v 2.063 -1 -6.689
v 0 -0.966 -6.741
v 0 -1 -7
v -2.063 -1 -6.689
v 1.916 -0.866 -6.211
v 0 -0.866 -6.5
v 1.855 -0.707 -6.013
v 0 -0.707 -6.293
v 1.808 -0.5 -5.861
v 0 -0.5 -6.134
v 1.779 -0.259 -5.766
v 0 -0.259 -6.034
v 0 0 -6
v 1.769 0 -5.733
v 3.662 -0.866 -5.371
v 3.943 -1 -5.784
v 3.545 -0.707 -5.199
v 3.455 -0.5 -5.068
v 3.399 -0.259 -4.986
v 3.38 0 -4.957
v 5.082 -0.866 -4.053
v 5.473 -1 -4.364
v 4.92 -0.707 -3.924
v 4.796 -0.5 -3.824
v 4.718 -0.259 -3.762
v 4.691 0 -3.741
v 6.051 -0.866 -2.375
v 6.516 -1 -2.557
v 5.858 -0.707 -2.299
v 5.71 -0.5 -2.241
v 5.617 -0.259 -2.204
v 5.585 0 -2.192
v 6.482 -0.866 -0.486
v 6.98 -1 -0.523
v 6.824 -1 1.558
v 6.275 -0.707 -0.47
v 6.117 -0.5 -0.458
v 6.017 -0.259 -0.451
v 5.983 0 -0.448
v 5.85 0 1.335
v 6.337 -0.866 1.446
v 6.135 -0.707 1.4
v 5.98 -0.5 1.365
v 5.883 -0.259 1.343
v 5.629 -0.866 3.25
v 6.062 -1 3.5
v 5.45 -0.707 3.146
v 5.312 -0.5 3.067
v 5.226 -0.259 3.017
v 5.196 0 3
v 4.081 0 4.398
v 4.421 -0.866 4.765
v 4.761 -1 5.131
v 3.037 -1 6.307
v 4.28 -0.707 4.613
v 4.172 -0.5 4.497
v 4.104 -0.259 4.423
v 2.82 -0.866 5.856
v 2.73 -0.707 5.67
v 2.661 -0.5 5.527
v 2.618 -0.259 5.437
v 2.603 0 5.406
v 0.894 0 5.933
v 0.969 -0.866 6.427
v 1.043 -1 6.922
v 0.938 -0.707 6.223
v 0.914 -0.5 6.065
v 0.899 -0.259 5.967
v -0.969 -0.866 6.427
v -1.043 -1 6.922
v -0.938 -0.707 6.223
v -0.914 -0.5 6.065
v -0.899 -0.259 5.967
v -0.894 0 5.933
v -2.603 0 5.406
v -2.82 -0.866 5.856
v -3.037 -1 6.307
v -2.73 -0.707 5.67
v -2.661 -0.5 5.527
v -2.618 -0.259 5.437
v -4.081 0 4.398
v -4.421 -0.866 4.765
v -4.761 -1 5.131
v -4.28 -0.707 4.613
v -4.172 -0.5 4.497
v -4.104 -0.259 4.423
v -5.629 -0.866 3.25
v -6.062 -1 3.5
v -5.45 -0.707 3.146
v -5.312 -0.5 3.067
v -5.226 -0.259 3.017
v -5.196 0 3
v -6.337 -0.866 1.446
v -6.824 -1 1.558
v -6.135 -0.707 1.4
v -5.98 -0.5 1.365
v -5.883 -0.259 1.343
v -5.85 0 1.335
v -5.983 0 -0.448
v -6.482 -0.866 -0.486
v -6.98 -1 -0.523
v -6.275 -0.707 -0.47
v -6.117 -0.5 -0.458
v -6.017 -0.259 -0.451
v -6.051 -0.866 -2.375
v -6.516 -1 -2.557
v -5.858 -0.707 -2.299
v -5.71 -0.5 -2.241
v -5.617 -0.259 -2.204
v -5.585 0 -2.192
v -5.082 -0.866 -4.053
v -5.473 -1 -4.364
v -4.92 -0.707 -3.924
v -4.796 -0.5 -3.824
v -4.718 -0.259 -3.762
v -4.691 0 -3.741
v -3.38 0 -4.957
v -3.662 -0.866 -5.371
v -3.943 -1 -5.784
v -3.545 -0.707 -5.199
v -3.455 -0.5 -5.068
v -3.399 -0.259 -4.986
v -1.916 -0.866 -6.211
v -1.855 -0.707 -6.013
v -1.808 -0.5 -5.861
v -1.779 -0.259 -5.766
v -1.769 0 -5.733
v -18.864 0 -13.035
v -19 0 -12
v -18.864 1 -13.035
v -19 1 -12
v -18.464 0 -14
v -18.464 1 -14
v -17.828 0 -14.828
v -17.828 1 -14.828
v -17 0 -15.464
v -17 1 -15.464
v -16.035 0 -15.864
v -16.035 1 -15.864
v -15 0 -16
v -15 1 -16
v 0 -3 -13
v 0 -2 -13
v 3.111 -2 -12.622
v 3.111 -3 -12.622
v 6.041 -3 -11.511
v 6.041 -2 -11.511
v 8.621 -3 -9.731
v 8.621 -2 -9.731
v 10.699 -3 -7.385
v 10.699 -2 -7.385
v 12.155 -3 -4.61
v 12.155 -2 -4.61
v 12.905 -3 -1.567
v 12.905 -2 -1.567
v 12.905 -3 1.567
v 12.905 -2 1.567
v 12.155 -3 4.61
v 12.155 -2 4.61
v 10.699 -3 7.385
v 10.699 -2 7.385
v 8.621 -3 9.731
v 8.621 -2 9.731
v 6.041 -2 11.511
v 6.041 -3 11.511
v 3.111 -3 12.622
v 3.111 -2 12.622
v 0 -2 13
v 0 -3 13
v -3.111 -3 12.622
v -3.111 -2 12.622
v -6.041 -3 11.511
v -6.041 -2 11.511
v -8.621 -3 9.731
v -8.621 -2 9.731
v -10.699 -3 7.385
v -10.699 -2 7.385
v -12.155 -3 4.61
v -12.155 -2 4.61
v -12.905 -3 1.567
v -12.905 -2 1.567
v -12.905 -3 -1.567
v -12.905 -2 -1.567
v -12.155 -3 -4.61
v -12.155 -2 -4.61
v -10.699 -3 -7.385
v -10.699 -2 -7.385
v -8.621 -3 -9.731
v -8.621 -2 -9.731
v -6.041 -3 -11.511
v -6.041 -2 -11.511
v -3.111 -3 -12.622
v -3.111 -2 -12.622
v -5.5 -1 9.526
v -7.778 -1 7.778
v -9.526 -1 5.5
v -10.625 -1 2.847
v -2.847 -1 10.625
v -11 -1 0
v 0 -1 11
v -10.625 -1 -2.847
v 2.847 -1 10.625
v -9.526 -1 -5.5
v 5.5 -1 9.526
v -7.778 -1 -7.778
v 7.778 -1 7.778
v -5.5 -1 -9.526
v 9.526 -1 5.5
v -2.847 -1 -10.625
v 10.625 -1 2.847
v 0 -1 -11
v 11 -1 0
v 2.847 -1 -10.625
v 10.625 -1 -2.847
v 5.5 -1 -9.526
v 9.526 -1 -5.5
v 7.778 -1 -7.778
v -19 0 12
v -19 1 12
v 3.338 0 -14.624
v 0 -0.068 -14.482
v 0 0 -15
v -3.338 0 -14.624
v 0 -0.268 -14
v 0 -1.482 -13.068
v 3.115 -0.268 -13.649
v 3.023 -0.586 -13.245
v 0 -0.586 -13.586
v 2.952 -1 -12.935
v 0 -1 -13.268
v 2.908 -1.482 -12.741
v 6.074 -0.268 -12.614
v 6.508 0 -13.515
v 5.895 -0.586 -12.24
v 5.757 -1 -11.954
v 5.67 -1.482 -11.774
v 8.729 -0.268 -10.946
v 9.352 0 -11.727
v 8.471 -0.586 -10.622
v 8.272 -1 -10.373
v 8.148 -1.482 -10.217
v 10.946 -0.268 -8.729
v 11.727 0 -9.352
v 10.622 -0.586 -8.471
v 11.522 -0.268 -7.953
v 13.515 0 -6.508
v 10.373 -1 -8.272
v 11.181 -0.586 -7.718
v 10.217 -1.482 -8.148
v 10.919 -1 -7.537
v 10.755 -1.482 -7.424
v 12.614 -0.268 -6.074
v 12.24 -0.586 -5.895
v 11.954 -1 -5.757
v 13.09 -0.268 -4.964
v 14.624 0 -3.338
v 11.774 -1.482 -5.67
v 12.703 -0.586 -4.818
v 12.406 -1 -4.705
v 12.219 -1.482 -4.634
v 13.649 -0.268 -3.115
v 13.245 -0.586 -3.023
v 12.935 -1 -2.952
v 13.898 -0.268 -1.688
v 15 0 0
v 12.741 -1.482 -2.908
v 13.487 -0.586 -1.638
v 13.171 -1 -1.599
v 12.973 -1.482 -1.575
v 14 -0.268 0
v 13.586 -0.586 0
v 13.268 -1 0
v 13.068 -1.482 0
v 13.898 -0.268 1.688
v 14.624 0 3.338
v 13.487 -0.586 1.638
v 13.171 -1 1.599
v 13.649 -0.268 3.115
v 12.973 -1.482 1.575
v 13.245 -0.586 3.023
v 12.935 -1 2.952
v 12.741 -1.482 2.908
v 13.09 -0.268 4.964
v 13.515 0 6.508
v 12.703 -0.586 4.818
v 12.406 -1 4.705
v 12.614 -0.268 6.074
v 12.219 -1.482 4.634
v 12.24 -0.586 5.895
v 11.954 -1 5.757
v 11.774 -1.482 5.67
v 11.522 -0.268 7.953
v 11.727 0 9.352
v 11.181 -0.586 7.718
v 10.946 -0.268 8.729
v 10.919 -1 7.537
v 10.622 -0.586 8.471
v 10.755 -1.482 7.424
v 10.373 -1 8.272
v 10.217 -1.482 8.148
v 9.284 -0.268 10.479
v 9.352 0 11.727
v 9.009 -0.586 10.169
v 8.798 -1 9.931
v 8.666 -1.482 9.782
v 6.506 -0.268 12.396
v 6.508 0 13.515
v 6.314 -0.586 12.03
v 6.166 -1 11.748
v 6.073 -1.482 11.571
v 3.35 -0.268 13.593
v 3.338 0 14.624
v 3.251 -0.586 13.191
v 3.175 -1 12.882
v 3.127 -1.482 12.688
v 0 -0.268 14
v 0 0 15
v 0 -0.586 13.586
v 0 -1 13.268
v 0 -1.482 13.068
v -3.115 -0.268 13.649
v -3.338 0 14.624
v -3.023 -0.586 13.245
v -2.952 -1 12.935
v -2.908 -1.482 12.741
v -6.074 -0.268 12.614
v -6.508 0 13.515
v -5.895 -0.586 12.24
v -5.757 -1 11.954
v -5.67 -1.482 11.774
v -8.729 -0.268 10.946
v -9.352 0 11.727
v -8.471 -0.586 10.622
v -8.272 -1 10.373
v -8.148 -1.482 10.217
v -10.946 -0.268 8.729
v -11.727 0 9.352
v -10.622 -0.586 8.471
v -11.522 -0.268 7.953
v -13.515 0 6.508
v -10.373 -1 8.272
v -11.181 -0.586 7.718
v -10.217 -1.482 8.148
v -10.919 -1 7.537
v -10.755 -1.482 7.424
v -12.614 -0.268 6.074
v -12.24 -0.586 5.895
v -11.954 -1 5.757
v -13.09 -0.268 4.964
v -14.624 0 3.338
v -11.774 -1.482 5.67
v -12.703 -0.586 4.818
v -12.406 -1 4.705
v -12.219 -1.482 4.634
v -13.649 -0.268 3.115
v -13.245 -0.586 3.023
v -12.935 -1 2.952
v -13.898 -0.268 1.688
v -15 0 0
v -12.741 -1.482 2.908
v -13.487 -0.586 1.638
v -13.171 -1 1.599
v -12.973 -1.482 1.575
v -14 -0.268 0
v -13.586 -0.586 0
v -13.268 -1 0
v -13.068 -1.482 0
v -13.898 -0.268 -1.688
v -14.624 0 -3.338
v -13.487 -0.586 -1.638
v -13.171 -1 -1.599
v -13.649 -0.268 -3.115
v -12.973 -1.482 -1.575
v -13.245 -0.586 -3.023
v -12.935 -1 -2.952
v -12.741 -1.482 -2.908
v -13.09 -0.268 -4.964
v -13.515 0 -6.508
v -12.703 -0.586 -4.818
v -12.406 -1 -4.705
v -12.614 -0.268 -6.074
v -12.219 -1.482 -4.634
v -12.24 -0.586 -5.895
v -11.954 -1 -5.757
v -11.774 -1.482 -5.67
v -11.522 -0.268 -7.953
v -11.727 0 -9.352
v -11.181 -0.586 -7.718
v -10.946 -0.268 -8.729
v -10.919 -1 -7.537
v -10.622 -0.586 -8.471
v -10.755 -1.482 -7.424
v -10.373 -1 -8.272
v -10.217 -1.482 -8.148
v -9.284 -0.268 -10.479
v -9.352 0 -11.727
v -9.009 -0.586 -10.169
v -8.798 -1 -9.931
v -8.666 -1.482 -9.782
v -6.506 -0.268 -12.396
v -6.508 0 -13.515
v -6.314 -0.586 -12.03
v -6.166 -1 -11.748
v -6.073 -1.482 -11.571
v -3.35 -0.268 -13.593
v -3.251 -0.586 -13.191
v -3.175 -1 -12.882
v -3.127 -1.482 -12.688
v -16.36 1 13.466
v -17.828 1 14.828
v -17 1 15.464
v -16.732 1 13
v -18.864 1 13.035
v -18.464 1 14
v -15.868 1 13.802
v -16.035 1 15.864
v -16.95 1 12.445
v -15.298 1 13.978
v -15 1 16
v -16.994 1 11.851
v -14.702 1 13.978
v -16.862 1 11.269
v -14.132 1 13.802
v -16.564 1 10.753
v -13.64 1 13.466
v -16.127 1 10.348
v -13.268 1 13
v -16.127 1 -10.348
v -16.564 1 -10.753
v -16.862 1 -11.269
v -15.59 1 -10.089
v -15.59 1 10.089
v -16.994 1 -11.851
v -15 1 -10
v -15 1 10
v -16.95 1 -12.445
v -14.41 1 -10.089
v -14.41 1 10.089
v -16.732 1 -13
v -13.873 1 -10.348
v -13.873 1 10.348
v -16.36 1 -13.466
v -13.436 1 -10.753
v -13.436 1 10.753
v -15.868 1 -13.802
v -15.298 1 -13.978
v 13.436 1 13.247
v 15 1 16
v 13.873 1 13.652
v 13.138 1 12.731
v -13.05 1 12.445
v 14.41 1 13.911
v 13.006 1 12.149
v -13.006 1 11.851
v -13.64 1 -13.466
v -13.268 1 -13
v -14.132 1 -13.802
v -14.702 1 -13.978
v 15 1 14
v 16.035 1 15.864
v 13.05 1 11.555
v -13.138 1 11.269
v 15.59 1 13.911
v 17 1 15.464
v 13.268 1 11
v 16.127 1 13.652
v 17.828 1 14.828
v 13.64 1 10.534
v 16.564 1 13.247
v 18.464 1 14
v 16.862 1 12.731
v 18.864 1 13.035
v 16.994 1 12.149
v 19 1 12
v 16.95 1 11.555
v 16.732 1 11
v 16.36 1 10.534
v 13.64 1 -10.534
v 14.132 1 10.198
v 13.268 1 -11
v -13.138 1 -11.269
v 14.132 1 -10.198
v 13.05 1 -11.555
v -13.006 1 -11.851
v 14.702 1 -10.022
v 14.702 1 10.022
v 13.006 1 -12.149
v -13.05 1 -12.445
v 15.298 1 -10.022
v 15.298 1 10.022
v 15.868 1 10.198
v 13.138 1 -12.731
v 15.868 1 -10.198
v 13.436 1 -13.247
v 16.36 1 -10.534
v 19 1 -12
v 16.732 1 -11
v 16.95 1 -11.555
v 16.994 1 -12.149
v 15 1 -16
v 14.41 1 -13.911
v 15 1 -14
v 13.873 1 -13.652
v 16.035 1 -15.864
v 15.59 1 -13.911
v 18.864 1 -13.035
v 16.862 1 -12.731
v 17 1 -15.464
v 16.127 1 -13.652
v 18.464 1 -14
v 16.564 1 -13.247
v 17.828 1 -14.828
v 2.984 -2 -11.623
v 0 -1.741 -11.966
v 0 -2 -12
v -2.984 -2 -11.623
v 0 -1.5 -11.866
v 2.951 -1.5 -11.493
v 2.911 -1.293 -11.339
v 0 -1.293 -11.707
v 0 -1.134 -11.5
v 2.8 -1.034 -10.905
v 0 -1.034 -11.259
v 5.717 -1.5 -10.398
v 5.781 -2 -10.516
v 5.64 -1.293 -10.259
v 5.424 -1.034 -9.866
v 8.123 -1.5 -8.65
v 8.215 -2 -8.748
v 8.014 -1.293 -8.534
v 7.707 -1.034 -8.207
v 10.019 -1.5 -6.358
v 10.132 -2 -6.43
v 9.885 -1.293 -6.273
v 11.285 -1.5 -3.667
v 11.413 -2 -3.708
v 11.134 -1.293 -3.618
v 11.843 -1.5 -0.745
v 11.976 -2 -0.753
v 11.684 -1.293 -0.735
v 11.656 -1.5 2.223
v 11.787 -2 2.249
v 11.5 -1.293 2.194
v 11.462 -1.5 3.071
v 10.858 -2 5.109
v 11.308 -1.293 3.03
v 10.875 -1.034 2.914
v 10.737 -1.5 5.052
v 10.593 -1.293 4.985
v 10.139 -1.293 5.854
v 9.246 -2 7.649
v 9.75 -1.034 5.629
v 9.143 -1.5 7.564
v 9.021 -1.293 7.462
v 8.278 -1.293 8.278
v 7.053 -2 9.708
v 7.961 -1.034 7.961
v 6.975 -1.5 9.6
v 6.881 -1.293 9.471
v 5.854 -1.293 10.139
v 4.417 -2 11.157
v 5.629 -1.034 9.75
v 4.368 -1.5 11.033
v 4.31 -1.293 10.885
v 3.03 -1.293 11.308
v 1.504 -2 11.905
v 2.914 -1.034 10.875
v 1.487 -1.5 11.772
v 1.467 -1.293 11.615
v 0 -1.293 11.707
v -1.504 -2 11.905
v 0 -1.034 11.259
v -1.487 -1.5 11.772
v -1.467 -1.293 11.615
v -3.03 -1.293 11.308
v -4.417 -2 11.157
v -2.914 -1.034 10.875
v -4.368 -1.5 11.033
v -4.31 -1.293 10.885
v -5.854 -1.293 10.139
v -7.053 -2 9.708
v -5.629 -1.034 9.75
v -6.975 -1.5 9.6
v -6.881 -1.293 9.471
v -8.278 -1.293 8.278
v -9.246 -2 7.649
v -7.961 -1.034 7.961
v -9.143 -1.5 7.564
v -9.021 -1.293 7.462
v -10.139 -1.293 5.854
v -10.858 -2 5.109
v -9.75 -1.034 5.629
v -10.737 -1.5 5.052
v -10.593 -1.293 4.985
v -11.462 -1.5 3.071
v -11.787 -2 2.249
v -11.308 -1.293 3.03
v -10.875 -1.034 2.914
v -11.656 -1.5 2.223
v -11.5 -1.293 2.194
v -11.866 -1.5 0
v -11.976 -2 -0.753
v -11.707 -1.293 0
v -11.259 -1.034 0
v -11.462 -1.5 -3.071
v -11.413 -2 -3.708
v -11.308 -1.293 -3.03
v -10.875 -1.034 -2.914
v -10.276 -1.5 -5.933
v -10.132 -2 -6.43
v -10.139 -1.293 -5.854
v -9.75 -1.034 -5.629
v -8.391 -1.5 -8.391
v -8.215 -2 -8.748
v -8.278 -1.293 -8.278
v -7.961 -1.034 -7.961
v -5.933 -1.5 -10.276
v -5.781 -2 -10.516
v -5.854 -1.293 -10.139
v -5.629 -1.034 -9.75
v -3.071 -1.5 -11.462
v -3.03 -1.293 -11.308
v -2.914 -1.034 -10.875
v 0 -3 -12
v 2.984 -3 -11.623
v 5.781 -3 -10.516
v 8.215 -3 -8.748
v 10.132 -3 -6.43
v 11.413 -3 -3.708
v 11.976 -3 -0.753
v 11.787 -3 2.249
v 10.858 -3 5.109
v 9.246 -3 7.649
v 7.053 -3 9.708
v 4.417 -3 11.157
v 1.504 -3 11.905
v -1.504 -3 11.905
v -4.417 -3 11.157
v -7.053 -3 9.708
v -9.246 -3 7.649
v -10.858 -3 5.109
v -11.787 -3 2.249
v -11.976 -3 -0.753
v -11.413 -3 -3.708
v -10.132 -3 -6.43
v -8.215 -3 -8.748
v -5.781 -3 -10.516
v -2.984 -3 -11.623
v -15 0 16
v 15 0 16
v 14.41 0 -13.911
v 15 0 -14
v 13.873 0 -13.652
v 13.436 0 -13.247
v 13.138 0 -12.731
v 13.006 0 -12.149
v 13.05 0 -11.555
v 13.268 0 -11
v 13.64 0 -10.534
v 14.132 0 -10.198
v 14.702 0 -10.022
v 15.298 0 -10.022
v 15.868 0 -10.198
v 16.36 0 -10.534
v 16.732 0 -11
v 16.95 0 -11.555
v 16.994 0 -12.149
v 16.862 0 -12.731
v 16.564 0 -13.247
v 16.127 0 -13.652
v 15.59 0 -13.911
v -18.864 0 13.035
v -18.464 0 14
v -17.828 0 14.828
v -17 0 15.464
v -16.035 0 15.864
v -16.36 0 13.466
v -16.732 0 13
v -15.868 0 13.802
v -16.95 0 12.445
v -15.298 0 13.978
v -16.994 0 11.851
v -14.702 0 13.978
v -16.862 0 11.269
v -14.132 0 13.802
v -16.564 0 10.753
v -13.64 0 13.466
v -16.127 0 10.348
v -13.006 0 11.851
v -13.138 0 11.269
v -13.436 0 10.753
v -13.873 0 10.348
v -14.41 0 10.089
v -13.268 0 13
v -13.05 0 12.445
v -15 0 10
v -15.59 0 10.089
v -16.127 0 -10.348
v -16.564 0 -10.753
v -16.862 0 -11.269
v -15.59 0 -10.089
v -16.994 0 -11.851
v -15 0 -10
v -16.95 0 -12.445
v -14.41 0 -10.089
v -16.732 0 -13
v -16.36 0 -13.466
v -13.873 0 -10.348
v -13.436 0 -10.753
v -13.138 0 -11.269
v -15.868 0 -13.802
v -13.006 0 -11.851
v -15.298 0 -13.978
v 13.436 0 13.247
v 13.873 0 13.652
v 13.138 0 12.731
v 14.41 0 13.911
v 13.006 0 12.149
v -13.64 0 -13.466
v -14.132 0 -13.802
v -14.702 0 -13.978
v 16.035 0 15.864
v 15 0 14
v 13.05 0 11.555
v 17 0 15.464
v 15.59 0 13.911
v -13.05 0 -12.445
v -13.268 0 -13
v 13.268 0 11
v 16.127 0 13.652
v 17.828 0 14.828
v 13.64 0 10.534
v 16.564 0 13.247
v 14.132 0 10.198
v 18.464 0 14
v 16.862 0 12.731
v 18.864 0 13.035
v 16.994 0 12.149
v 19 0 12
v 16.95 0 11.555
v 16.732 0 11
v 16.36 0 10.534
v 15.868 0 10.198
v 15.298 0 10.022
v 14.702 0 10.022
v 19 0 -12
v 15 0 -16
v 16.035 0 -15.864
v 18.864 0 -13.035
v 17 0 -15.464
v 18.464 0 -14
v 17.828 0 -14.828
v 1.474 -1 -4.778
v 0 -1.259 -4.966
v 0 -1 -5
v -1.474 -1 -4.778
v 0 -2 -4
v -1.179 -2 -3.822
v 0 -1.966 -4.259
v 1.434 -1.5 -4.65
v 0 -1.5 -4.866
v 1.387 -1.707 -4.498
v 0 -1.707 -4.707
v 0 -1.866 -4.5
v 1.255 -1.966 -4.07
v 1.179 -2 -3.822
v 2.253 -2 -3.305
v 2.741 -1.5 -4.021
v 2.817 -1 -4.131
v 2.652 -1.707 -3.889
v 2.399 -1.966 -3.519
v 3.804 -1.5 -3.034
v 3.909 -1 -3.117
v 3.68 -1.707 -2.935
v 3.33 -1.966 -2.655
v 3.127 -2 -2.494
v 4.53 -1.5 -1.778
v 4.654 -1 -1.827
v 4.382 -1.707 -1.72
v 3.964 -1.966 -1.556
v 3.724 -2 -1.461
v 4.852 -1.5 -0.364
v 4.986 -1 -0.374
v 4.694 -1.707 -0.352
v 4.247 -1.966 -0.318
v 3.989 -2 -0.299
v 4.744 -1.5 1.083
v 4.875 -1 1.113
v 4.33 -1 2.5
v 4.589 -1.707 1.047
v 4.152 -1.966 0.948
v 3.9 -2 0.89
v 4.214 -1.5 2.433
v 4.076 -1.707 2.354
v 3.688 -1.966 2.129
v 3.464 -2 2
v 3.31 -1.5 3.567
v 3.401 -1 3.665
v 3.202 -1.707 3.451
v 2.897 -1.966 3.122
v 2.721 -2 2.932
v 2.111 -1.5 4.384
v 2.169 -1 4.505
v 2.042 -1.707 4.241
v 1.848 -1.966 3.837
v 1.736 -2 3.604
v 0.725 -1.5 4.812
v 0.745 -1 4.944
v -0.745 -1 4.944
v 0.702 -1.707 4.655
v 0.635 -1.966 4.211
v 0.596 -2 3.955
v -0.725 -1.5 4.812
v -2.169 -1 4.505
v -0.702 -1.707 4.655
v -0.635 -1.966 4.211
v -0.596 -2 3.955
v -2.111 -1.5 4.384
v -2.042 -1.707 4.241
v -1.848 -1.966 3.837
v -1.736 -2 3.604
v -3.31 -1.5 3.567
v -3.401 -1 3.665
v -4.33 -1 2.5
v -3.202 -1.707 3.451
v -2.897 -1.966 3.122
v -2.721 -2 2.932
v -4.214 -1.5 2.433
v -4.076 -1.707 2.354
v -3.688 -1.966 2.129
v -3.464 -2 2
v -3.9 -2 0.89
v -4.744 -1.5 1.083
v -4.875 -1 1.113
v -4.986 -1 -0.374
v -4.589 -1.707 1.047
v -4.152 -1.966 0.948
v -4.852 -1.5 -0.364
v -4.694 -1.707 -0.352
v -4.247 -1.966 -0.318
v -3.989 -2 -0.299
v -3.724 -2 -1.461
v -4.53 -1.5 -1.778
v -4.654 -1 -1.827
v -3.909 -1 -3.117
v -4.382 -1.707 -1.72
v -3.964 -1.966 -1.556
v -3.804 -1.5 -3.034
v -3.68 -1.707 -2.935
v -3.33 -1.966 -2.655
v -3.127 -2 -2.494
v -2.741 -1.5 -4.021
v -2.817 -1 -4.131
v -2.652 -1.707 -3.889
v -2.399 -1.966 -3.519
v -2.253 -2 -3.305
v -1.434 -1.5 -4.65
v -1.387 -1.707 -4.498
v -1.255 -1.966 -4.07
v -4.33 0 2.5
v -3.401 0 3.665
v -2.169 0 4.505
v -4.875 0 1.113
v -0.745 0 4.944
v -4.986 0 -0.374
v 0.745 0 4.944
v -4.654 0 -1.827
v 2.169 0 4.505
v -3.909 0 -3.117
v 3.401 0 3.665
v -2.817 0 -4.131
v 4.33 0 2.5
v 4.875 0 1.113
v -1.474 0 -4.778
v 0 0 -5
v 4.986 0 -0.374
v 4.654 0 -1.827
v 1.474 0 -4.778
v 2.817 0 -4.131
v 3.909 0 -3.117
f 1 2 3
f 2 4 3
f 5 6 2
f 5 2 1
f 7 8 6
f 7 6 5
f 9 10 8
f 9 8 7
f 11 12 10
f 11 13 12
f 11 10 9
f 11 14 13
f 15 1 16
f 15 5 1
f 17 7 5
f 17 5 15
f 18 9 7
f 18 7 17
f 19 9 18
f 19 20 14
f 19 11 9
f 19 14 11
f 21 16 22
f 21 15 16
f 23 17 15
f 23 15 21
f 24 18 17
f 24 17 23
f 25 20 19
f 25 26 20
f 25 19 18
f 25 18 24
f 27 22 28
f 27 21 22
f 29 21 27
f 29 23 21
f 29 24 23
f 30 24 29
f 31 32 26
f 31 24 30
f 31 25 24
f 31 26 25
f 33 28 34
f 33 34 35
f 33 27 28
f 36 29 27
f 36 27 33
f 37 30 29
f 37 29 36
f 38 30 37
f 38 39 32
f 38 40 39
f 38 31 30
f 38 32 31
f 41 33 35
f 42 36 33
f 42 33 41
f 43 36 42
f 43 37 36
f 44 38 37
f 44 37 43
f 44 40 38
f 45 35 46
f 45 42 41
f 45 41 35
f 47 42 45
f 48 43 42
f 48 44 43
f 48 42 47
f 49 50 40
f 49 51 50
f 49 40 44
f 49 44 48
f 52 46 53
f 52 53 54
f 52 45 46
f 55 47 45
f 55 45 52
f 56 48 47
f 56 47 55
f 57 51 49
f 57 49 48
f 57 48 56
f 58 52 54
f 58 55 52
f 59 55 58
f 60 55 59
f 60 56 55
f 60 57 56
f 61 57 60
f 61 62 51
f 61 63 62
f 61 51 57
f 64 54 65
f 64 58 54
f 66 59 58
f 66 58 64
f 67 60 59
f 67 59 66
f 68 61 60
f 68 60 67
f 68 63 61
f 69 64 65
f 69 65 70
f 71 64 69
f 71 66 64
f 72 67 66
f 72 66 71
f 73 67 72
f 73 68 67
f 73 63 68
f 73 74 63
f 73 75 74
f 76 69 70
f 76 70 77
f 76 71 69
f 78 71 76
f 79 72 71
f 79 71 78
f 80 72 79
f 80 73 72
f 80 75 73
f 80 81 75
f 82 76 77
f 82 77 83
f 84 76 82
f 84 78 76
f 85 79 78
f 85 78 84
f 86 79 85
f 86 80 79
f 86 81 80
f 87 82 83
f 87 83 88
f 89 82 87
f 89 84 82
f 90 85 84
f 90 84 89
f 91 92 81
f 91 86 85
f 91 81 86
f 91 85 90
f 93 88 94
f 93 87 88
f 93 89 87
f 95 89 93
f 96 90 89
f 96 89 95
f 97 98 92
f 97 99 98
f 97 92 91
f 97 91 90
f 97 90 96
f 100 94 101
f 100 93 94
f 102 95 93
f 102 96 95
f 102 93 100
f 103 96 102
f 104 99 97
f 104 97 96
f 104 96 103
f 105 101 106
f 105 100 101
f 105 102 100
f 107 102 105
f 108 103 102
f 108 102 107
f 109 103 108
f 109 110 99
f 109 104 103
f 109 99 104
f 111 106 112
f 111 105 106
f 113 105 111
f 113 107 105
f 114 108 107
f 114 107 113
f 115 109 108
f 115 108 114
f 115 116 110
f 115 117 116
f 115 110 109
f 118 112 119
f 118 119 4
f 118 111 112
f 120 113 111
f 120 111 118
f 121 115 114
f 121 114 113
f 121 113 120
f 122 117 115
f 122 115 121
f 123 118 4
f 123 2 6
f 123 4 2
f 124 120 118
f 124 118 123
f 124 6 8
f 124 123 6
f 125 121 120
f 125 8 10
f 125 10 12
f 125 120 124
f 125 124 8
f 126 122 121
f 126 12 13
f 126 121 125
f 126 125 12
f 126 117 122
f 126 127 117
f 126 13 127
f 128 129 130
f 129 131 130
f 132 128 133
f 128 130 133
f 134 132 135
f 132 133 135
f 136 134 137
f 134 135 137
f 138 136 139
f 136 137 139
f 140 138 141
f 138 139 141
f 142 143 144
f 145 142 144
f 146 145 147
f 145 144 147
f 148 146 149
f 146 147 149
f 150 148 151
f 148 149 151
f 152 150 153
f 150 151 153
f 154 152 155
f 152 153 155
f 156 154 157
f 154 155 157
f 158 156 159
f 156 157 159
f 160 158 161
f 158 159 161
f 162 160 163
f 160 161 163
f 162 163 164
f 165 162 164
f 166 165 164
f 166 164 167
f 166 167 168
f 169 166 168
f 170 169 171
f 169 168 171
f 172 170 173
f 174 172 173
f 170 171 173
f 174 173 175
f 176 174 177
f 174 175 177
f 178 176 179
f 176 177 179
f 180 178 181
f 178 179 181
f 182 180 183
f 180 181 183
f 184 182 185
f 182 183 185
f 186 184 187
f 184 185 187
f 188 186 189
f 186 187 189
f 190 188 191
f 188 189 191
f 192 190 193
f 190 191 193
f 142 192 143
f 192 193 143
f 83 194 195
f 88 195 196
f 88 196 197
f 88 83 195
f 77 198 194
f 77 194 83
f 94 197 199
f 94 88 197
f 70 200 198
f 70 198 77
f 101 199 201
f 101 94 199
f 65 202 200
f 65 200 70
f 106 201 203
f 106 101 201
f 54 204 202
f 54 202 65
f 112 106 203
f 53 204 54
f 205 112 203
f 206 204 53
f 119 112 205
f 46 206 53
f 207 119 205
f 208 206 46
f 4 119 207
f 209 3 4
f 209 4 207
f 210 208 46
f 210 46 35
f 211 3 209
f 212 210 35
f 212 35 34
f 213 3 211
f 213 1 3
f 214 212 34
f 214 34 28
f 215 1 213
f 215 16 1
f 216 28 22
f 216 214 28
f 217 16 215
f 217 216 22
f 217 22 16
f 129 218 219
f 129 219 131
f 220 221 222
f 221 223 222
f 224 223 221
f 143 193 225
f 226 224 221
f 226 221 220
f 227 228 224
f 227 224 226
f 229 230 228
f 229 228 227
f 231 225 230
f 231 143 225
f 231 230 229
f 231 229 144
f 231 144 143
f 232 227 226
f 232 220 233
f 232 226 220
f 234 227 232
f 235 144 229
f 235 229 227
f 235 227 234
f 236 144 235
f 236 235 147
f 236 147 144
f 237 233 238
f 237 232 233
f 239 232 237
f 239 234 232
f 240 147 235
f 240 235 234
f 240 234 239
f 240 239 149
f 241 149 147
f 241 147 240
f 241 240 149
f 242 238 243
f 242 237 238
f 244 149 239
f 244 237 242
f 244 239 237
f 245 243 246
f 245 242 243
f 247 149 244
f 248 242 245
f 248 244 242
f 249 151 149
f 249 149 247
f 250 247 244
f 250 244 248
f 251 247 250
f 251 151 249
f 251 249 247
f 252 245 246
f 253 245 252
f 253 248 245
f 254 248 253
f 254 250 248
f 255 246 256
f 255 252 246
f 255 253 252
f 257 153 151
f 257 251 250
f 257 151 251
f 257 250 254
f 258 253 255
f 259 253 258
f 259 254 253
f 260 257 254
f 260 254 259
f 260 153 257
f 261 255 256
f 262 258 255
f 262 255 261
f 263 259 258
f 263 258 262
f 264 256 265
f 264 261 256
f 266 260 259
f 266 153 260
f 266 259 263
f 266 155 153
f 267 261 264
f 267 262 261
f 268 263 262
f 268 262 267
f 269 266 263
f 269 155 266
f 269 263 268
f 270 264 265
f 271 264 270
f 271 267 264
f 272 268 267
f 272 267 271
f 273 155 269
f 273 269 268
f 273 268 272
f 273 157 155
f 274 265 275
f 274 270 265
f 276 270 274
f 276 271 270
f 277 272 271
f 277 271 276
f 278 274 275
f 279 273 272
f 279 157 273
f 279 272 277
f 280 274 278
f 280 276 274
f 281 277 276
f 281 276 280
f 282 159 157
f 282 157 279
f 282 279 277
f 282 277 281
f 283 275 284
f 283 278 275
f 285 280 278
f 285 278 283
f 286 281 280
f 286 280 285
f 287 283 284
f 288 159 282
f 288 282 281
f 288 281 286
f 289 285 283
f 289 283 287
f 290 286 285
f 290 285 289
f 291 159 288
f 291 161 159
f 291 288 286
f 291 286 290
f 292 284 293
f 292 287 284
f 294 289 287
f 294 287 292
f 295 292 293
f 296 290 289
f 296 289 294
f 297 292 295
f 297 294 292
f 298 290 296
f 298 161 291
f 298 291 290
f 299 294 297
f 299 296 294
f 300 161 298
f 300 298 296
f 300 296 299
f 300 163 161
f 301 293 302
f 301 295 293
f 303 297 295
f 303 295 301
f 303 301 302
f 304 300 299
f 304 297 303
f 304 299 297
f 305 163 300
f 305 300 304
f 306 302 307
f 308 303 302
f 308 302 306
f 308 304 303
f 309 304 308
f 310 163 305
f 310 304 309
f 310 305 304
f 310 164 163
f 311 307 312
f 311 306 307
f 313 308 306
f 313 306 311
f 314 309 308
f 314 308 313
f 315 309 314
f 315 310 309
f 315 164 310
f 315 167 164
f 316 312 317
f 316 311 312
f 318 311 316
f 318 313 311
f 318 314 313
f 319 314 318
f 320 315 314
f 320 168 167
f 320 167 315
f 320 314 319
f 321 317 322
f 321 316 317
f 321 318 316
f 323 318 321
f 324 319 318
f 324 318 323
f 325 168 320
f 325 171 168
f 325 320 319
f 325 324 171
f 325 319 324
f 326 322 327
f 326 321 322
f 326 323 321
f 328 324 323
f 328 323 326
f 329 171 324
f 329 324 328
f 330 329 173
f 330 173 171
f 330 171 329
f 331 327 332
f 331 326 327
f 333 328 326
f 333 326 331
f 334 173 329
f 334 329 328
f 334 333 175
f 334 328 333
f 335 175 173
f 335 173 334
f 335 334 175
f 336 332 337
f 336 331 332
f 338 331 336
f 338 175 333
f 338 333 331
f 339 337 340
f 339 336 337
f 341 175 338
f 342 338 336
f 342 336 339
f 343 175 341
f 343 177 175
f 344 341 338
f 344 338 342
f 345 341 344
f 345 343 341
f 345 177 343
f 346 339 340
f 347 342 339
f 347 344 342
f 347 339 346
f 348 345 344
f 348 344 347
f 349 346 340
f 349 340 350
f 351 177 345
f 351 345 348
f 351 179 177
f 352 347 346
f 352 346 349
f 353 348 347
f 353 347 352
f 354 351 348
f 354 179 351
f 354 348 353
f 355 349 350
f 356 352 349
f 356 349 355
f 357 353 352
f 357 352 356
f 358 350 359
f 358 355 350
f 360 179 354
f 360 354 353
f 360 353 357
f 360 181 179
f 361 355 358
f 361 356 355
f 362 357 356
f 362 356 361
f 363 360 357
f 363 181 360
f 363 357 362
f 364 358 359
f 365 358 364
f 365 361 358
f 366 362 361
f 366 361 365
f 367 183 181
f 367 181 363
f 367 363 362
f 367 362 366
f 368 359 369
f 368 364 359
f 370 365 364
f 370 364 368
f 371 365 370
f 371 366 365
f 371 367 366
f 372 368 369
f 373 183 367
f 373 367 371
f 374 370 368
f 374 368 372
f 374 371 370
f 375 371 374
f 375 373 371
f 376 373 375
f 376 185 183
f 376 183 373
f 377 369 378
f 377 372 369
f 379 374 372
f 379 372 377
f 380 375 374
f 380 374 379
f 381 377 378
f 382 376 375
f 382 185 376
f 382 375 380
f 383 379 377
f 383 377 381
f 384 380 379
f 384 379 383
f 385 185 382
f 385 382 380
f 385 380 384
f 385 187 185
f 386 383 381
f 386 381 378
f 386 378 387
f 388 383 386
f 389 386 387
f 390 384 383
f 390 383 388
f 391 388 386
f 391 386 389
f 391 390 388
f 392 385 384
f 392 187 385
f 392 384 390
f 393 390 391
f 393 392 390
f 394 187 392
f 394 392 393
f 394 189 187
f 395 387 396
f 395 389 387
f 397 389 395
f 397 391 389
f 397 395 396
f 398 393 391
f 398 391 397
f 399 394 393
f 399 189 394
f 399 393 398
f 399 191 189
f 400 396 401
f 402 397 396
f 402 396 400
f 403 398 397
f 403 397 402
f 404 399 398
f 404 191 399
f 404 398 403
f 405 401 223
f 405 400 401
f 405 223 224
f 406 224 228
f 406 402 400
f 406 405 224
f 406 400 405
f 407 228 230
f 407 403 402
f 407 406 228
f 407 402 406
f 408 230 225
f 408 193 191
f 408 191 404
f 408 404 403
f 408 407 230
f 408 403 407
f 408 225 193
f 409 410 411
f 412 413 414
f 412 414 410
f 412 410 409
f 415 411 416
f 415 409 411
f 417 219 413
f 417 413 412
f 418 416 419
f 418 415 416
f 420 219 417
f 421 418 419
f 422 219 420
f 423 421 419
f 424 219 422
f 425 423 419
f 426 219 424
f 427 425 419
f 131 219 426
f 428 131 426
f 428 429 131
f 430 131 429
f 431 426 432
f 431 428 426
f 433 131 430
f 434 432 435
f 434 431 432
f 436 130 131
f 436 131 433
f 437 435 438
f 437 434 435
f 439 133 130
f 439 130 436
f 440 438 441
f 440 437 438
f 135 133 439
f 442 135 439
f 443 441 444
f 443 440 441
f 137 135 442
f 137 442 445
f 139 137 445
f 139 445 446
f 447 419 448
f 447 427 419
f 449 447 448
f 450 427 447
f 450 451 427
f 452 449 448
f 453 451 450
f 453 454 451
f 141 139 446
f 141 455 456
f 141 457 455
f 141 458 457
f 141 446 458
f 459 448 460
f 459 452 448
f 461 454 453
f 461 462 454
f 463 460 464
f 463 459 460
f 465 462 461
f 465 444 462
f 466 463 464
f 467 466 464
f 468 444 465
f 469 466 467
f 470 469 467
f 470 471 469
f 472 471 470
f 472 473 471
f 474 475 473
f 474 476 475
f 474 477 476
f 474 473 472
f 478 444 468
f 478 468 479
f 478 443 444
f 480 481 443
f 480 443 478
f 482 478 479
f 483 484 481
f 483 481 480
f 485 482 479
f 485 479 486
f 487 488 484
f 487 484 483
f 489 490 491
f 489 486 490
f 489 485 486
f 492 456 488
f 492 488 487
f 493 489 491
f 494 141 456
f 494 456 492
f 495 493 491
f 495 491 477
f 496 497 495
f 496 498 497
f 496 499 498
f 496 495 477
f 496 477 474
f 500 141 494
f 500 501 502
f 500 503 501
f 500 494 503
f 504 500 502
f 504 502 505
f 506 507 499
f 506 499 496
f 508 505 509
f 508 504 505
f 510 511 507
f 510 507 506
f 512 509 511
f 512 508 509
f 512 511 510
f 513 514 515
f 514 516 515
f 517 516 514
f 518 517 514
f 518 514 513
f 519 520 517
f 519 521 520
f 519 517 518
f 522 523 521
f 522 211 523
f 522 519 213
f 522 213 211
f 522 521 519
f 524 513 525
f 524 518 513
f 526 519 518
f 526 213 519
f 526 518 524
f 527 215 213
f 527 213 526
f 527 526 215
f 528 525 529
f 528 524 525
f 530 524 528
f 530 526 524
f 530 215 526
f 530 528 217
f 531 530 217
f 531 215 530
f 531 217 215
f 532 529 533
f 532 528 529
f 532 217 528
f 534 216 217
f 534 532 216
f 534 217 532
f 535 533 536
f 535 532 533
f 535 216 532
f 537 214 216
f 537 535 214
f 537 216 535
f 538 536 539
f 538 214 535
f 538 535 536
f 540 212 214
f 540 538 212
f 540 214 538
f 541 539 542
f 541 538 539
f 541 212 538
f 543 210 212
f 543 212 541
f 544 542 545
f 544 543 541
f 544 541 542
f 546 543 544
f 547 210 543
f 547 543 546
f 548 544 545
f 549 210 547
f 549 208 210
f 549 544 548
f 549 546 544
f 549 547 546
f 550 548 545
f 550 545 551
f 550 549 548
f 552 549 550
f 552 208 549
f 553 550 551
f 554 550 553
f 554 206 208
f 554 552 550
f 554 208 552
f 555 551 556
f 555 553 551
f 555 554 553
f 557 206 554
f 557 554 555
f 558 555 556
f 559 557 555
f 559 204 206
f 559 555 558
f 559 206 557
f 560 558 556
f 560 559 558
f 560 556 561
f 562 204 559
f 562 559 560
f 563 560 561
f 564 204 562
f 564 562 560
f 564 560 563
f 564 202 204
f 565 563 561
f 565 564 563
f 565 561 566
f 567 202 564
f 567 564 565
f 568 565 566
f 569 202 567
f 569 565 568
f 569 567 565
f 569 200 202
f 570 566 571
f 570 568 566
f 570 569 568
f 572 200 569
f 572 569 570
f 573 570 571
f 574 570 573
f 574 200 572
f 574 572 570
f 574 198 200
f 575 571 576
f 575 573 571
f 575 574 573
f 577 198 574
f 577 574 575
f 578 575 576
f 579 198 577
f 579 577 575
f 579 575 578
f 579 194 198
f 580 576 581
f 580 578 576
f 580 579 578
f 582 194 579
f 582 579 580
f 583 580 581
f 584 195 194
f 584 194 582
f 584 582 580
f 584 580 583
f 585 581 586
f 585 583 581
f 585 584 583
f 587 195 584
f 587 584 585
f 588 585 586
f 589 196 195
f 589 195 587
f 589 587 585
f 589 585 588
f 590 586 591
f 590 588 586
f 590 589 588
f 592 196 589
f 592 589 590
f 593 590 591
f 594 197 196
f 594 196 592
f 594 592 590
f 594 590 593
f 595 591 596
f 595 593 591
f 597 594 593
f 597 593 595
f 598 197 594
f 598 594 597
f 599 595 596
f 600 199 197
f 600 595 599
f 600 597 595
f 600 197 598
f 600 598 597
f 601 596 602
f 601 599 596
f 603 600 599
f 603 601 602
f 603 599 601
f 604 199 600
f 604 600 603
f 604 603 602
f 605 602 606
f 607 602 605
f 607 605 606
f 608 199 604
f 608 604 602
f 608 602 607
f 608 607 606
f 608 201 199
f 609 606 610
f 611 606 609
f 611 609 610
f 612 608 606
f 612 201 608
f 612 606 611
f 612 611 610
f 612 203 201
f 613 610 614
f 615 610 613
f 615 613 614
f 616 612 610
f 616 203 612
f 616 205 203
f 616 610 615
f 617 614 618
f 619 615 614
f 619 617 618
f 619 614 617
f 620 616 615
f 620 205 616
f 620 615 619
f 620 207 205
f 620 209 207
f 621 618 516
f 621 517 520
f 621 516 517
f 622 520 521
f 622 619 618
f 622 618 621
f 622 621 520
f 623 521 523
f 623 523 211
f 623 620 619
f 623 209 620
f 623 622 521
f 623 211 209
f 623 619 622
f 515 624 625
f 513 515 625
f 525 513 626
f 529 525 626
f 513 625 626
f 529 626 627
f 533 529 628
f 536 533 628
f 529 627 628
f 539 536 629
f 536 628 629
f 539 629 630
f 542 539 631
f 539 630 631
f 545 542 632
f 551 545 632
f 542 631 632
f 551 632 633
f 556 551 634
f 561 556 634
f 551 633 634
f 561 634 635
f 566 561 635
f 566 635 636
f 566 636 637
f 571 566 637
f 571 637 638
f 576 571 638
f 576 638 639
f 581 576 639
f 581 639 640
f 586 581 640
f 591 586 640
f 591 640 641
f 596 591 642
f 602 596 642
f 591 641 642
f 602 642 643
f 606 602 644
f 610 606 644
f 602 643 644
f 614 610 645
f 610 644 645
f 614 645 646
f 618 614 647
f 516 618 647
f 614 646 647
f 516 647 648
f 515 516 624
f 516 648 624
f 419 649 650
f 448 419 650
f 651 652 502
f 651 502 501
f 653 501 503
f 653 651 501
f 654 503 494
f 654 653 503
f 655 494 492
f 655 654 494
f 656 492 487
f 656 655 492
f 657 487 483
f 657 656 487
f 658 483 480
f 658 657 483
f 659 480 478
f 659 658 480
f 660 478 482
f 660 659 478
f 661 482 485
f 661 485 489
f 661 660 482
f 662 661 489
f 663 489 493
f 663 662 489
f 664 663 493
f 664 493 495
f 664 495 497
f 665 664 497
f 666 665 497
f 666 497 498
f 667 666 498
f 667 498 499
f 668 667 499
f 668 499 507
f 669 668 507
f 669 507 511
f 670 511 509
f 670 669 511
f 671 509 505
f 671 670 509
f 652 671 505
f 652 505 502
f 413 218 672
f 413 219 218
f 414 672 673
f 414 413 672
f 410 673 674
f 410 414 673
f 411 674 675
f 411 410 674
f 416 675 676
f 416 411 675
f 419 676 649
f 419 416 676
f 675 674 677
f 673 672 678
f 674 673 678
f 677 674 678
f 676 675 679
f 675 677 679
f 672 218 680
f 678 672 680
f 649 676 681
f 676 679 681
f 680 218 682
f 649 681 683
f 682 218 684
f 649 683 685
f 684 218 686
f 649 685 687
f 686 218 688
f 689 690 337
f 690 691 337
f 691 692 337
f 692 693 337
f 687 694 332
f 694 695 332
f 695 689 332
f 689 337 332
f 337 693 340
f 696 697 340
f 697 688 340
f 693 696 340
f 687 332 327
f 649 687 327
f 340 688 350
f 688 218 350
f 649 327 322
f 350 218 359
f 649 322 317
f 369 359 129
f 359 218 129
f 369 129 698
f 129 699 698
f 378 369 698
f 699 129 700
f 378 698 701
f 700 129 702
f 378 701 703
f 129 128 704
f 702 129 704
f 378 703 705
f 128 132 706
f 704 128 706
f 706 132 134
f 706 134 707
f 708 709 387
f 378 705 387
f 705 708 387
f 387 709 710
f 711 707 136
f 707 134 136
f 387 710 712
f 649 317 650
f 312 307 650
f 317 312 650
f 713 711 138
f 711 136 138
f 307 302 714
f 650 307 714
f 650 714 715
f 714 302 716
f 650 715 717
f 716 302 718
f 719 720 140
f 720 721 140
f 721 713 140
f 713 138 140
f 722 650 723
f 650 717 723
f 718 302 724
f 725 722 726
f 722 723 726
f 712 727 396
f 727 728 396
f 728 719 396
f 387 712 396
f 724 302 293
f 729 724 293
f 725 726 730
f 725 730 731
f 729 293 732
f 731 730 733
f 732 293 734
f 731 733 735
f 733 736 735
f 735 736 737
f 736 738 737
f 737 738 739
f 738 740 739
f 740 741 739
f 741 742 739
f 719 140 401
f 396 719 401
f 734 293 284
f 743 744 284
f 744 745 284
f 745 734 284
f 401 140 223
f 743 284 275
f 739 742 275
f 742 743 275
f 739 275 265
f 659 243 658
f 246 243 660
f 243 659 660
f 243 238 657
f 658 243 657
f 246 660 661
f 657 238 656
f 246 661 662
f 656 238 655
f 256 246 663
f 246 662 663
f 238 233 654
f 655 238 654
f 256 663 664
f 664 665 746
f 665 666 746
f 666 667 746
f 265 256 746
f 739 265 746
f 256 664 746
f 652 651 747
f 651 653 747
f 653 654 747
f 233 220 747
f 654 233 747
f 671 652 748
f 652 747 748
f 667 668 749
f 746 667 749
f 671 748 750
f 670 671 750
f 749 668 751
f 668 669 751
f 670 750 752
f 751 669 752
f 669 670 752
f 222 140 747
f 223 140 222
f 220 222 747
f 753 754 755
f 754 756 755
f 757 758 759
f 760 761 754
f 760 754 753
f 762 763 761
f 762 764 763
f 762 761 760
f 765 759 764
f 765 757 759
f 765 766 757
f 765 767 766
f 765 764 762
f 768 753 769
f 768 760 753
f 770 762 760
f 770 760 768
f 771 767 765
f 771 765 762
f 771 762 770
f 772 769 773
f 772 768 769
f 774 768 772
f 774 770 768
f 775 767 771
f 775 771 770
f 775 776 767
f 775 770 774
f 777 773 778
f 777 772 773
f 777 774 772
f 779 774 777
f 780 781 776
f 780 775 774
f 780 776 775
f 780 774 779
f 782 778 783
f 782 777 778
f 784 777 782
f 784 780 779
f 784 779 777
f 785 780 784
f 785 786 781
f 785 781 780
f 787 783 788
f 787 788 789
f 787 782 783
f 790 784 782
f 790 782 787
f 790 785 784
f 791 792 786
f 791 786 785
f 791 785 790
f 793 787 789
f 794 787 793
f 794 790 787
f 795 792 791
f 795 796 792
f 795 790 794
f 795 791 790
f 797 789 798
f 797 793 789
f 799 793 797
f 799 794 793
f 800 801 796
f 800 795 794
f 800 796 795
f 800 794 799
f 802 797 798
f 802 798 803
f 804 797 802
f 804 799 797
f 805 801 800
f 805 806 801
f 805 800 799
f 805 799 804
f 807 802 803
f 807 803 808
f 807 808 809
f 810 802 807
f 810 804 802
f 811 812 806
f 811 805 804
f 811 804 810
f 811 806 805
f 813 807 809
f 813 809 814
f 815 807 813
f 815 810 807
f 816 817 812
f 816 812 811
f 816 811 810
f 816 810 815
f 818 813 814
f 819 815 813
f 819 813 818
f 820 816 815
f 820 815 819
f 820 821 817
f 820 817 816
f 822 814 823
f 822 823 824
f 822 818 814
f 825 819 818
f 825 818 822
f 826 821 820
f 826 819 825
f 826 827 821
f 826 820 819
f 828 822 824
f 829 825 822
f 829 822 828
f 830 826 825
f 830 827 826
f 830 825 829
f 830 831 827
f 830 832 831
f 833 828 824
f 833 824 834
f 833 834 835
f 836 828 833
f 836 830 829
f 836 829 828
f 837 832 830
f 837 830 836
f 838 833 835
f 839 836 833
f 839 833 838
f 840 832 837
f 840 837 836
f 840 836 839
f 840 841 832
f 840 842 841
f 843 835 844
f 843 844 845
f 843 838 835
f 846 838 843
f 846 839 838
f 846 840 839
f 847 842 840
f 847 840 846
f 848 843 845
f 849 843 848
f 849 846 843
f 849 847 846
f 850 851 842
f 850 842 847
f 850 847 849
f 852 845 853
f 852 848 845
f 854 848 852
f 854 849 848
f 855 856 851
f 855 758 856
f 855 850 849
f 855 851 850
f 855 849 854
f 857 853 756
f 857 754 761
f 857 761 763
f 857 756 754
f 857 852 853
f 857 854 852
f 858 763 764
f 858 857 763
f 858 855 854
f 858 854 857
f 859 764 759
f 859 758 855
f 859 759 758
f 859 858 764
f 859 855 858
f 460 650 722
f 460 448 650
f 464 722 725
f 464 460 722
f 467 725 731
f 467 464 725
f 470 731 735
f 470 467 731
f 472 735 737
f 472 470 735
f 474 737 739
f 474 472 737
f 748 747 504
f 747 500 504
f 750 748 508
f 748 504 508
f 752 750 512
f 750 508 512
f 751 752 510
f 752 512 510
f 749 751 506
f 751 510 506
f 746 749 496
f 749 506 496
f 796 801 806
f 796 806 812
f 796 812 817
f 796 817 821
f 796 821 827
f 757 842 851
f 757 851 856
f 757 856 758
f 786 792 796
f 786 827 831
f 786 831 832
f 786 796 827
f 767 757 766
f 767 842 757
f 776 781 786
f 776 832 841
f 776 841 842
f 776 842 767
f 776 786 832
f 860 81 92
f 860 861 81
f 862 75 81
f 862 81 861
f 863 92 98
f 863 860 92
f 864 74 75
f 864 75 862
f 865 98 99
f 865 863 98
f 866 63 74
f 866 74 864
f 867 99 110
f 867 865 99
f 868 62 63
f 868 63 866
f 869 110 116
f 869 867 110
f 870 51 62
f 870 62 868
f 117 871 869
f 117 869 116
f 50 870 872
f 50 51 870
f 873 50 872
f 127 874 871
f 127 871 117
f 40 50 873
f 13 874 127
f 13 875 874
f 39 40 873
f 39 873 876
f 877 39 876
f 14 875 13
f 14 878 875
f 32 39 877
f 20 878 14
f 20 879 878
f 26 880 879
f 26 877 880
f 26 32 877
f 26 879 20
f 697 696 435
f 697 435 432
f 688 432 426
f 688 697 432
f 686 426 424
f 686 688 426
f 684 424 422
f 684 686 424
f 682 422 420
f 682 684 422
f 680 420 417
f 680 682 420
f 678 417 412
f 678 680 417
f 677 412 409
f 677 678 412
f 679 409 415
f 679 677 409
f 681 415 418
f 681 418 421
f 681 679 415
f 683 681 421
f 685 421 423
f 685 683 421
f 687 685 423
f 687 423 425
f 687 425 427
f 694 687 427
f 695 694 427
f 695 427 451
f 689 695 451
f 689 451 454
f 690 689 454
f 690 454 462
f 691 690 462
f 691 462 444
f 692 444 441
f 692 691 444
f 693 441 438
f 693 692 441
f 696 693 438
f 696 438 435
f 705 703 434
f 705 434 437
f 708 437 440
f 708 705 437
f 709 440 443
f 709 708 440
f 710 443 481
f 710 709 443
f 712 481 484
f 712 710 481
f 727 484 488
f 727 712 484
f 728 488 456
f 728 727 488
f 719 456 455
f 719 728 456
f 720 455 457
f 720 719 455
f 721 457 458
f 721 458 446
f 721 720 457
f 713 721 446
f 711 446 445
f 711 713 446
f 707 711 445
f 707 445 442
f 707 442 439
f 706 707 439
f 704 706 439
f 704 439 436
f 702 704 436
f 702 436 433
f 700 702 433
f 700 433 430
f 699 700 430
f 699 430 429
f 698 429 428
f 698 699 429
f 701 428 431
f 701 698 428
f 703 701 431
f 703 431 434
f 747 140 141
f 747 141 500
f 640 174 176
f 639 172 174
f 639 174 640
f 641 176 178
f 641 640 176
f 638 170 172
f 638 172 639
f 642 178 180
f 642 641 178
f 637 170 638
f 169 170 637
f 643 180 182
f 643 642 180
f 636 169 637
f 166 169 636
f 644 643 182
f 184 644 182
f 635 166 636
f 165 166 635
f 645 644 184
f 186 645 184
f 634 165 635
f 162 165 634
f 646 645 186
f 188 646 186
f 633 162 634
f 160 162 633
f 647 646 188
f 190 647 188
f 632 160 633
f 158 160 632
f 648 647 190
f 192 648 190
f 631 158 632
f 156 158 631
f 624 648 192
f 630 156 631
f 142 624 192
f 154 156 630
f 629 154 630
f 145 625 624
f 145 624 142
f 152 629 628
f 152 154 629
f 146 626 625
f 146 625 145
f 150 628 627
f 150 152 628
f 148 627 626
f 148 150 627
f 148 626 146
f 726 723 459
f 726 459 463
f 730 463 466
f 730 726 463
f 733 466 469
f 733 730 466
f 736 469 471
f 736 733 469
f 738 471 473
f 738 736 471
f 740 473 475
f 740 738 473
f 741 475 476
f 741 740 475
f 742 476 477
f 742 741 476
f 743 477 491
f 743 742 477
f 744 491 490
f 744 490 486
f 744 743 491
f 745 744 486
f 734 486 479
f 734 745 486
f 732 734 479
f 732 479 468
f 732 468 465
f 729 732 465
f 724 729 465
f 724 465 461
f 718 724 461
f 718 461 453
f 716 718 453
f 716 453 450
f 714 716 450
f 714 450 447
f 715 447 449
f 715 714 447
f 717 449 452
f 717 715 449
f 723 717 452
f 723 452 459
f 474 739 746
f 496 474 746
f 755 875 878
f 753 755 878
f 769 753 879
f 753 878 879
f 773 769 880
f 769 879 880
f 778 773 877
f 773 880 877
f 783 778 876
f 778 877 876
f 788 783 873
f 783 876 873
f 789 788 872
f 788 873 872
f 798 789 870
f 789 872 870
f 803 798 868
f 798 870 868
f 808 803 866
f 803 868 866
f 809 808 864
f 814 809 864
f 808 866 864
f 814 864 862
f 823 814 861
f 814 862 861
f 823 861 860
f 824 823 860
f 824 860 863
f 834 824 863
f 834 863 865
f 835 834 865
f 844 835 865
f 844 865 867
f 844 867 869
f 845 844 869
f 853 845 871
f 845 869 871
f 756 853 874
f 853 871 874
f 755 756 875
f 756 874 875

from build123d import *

# Parameters (mm, degrees)
SKETCH2_W           = 38
SKETCH2_H           = 32
SKETCH2_R           = 2
BOSS_EXTRUDE1_DEPTH = 1
FILLET1_R           = 4
SKETCH3_R           = 13
BOSS_EXTRUDE2_DEPTH = 3
SKETCH4_R           = 12
CUT_EXTRUDE1_DEPTH  = 2
FILLET2_R           = 2
SKETCH5_R           = 6
CUT_EXTRUDE4_DEPTH  = 1
SKETCH11_R          = 5
BOSS_EXTRUDE5_DEPTH = 2
FILLET7_R           = 1


with BuildPart() as part:
    # Sketch2 → Boss-Extrude1 (new body)
    with BuildSketch(Plane(origin=(0, 0, 0), x_dir=(1, 0, 0), z_dir=(0, 1, 0))):
        Rectangle(SKETCH2_W, SKETCH2_H)
        with Locations(Location((-15, 12, 0), (0, 0, 270))):
            Circle(SKETCH2_R, mode=Mode.SUBTRACT)
        with Locations(Location((15, 12, 0), (0, 0, 90))):
            Circle(SKETCH2_R, mode=Mode.SUBTRACT)
        with Locations(Location((15, -12, 0), (0, 0, 270))):
            Circle(SKETCH2_R, mode=Mode.SUBTRACT)
        with Locations(Location((-15, -12, 0), (0, 0, 90))):
            Circle(SKETCH2_R, mode=Mode.SUBTRACT)
    extrude(amount=BOSS_EXTRUDE1_DEPTH)

    # Fillet1
    fillet1_edges = [part.edges().sort_by_distance(p)[0] for p in [
        (-19, 0.5, -16),
        (19, 0.5, -16),
        (19, 0.5, 16),
        (-19, 0.5, 16),
    ]]
    fillet(fillet1_edges, radius=FILLET1_R)

    # Sketch3 → Boss-Extrude2 (add)
    with BuildSketch(Plane.XZ):
        with Locations(Location((0, 0, 0), (0, 0, 270))):
            Circle(SKETCH3_R)
    extrude(amount=BOSS_EXTRUDE2_DEPTH)

    # Sketch4 → Cut-Extrude1 (cut)
    with BuildSketch(Plane.XZ.offset(3)):
        with Locations(Location((0, 0, 0), (0, 0, 270))):
            Circle(SKETCH4_R)
    extrude(amount=-CUT_EXTRUDE1_DEPTH, mode=Mode.SUBTRACT)

    # Fillet2
    fillet2_edges = [part.edges().sort_by_distance(p)[0] for p in [
        (0, 0, 13),
    ]]
    fillet(fillet2_edges, radius=FILLET2_R)

    # Sketch5 → Cut-Extrude4 (cut)
    with BuildSketch(Plane.XZ.offset(1)):
        with Locations(Location((0, 0, 0), (0, 0, 270))):
            Circle(SKETCH5_R)
    extrude(amount=-CUT_EXTRUDE4_DEPTH, mode=Mode.SUBTRACT)

    # Sketch11 → Boss-Extrude5 (add)
    with BuildSketch(Plane.XZ):
        with Locations(Location((0, 0, 0), (0, 0, 270))):
            Circle(SKETCH11_R)
    extrude(amount=BOSS_EXTRUDE5_DEPTH)

    # Fillet7
    fillet7_edges = [part.edges().sort_by_distance(p)[0] for p in [
        (0, -1, 12),
        (0, -1, 6),
        (0, -2, 5),
    ]]
    fillet(fillet7_edges, radius=FILLET7_R - 0.0001)  # a hair under: the kernel refuses the full size


solid = part.part
